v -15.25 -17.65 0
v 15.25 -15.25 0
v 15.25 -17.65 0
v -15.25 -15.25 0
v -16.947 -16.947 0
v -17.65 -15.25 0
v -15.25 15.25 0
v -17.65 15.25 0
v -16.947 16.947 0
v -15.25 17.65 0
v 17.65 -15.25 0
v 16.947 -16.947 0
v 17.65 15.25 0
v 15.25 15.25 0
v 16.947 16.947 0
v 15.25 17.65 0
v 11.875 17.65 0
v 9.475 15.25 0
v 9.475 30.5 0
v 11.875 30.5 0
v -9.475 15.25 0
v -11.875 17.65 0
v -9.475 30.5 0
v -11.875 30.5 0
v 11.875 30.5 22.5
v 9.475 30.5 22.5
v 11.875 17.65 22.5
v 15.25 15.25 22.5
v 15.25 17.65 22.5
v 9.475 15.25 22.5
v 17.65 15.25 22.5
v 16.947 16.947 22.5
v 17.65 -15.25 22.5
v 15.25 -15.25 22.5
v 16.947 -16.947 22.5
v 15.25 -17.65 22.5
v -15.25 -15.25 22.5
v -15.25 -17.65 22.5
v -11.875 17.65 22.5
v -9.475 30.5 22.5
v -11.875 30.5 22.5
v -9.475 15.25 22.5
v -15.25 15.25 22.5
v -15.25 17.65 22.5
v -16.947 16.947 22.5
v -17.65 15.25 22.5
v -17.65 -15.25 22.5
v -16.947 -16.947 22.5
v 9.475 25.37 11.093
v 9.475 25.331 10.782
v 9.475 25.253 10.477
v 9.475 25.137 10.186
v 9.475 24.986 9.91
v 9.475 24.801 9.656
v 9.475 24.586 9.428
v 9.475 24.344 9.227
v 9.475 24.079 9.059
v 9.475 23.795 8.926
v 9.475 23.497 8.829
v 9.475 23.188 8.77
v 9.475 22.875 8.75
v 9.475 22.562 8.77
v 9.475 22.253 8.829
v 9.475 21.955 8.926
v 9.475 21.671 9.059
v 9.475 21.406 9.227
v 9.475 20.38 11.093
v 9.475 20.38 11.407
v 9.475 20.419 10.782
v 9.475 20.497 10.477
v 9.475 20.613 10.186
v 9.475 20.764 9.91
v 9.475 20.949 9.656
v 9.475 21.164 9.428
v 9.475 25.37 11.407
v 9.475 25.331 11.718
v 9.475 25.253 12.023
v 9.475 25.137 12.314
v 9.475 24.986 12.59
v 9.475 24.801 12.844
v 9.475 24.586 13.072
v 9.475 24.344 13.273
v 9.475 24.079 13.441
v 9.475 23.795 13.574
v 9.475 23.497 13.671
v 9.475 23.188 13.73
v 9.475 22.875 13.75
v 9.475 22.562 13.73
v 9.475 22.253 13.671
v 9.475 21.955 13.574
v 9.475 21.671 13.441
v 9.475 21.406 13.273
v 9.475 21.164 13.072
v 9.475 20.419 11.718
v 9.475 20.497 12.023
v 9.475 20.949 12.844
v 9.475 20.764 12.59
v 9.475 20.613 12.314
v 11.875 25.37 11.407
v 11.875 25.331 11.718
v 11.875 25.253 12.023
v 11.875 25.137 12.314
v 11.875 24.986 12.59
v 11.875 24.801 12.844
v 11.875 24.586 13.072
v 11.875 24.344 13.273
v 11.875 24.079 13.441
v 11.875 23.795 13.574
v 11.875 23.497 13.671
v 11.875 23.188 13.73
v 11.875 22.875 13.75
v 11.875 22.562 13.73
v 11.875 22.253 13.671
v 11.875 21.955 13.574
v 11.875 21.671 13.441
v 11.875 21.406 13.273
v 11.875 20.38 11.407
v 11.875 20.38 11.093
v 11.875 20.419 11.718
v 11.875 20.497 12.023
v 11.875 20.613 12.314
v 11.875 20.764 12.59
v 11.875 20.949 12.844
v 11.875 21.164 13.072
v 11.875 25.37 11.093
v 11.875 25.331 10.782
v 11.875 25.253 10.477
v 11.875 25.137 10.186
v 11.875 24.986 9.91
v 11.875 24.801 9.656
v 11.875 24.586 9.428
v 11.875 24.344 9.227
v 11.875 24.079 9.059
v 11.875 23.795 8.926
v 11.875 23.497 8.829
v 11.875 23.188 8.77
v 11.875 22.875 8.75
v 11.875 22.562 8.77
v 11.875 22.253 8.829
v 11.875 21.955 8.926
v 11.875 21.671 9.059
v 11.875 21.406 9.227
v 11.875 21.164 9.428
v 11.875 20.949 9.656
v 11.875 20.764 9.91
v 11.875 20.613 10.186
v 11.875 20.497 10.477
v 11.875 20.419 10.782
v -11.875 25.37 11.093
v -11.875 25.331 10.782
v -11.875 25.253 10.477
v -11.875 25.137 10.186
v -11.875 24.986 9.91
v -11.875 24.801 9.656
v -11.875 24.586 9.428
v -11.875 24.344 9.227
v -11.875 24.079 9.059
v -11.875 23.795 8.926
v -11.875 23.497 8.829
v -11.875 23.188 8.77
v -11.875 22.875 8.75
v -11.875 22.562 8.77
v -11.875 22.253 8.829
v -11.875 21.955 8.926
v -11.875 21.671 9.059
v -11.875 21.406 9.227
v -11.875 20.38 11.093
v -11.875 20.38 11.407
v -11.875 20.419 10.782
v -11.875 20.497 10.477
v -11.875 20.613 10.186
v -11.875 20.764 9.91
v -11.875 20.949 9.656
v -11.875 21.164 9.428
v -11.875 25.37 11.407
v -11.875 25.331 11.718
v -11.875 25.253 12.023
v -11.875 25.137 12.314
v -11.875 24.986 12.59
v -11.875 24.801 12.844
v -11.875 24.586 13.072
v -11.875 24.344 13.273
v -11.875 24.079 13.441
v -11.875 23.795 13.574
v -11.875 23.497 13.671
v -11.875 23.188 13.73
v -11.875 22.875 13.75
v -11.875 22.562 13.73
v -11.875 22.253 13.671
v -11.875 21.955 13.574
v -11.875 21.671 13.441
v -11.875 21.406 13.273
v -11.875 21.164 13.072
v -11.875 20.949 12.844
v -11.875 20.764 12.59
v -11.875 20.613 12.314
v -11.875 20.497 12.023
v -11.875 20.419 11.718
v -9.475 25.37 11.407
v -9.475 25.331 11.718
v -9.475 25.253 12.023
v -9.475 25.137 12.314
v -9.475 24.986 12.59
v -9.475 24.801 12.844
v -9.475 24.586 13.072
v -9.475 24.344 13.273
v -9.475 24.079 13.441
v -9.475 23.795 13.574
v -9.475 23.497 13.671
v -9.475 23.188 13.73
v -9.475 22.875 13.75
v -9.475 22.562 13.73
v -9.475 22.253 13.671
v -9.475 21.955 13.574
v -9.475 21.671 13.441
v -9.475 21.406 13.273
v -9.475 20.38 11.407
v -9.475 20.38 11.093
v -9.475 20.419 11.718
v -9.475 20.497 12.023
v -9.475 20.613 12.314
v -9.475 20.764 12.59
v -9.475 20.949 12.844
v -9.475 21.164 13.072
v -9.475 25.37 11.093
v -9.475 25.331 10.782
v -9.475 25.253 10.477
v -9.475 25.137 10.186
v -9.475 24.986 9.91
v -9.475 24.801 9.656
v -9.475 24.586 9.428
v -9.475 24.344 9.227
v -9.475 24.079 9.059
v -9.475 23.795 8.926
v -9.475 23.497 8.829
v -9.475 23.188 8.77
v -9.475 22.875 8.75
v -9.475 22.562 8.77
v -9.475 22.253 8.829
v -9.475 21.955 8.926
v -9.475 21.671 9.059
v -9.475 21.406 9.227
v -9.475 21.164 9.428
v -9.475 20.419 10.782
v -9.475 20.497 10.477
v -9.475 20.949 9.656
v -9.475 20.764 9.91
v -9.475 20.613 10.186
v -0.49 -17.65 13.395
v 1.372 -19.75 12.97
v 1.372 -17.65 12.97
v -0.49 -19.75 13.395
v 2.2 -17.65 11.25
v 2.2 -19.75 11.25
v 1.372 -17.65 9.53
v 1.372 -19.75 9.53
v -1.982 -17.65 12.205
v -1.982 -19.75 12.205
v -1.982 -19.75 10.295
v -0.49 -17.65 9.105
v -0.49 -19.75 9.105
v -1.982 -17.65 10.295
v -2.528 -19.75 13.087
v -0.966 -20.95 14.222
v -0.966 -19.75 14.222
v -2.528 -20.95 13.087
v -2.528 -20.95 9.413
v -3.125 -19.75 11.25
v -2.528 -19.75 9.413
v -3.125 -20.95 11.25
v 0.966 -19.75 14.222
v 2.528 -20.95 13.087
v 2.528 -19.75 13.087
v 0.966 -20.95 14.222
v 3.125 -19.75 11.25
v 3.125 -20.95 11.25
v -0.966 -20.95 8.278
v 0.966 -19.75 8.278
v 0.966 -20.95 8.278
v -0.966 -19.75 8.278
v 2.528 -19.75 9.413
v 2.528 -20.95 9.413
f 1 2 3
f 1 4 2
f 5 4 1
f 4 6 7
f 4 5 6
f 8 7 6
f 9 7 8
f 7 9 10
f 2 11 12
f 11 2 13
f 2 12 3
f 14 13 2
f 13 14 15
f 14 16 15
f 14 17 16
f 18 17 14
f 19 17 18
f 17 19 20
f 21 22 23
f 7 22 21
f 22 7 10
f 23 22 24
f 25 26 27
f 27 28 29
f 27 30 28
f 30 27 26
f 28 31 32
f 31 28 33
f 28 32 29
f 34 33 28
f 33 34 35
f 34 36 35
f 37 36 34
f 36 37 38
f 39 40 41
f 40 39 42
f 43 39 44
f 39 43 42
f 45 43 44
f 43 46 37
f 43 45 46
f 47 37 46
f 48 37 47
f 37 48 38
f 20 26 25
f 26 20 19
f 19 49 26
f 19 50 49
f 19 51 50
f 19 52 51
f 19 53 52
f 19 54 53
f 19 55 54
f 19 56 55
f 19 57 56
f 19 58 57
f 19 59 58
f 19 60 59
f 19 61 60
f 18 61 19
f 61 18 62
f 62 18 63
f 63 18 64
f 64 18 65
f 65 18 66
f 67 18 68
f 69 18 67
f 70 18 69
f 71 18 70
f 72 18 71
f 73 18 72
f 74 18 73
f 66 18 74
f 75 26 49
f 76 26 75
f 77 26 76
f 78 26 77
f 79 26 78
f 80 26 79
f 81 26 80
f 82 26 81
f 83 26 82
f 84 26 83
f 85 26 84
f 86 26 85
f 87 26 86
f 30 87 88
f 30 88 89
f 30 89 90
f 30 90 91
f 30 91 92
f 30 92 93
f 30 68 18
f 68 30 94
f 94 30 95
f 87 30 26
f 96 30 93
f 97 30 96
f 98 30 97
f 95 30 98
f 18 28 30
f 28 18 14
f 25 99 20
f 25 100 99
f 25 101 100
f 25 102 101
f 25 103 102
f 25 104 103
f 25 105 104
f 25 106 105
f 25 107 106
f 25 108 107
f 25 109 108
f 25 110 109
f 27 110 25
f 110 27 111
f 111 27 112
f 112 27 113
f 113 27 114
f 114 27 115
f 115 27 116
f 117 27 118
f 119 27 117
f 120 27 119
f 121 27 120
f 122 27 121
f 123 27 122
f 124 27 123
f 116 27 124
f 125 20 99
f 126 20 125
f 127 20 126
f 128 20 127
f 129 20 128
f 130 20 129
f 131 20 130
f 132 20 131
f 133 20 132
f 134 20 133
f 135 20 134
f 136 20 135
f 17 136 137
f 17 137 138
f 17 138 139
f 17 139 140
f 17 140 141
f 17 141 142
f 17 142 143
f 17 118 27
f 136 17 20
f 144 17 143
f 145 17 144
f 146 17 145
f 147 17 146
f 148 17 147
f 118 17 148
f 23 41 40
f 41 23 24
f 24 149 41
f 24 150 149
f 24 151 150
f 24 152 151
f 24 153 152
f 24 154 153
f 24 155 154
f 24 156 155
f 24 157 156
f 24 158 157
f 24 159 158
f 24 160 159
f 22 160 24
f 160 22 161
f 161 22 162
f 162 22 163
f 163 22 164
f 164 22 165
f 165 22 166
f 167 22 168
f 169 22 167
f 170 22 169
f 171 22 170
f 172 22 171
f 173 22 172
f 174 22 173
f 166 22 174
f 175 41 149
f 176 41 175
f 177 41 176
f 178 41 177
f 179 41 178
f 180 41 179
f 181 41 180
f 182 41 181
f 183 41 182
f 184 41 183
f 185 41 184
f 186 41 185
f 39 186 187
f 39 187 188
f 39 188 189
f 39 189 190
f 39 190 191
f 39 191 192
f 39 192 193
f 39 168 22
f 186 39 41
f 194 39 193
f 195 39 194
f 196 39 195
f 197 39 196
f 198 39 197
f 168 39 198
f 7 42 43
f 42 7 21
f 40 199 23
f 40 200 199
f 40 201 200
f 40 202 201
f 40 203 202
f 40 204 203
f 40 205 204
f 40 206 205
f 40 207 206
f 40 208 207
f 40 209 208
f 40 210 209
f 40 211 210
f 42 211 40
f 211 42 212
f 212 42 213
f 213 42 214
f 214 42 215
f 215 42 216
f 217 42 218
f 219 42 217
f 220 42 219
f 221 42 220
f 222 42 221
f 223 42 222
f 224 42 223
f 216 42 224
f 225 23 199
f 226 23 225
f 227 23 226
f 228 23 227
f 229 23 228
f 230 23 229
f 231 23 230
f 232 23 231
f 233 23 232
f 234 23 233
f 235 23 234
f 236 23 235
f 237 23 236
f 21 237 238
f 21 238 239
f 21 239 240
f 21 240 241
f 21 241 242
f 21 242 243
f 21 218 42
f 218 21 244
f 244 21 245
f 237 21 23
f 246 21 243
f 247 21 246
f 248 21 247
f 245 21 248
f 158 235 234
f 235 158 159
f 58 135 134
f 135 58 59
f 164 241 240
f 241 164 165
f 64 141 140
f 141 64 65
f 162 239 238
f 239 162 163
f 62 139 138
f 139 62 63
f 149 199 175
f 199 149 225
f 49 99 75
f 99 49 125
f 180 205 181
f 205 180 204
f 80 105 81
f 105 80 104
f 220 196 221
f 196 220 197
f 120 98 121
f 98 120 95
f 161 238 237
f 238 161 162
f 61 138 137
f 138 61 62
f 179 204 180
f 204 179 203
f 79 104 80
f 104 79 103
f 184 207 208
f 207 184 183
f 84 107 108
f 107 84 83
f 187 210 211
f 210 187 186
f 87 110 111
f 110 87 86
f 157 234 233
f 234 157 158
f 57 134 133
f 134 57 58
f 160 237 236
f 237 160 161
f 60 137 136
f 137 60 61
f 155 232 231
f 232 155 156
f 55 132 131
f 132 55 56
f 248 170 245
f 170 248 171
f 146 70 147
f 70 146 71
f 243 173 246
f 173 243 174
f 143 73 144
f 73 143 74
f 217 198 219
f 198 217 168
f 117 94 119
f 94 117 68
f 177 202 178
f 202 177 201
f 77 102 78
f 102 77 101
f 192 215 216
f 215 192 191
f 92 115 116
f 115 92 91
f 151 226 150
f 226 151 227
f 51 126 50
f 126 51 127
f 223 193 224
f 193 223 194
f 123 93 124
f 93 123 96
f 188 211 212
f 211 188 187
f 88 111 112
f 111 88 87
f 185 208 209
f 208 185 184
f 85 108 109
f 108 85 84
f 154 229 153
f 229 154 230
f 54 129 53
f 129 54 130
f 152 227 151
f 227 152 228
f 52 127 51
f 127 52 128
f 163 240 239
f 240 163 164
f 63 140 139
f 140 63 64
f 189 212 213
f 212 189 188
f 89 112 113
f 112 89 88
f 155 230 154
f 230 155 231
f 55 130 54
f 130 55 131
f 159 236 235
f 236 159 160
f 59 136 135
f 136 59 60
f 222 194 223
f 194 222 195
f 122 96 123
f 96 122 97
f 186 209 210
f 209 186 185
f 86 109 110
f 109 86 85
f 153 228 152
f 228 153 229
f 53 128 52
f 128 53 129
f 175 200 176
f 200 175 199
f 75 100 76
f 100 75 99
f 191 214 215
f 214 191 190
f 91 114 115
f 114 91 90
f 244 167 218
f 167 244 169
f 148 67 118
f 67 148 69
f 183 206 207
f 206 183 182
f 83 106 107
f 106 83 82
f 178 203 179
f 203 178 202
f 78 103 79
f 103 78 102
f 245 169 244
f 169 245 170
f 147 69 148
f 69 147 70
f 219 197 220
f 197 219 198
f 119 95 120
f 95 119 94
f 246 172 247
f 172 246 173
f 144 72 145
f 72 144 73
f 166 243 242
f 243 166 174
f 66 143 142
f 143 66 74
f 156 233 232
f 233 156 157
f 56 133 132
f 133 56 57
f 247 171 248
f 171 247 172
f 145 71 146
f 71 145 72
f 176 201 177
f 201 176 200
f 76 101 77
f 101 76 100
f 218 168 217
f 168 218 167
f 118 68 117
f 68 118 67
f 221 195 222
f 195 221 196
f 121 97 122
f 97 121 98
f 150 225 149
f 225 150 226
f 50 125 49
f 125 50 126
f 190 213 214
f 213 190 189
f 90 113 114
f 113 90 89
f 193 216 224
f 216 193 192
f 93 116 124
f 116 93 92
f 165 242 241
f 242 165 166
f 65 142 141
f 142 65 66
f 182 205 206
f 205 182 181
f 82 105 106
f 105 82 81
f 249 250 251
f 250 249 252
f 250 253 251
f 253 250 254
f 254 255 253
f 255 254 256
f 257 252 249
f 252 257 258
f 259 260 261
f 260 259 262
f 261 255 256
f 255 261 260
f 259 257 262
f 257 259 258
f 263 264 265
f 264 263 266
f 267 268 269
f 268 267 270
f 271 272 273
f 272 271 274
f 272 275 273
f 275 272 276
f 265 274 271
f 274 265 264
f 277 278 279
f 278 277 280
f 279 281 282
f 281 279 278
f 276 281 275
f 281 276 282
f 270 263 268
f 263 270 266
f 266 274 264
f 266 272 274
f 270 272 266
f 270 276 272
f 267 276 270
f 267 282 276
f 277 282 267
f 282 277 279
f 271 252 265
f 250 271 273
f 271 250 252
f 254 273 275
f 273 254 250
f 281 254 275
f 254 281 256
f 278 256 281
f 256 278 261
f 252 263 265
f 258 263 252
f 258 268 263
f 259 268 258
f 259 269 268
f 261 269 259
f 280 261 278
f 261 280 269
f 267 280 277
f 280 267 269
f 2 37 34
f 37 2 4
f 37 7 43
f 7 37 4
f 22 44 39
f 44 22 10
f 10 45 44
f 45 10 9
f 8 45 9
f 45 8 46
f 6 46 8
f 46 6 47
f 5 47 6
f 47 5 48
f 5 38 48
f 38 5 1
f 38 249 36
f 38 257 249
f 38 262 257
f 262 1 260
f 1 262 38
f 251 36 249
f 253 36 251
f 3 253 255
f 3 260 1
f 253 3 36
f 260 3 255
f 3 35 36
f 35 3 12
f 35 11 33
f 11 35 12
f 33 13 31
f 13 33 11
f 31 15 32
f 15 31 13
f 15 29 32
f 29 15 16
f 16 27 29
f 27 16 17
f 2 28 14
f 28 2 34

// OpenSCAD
size = 30.5;  // The length of the square
height = 22.5; // originally height = size
thread = 0.4;
thickness = 6;
inset = size * 0.15;
length = size / 2;
screw_d = 5;

offset_ = thread * thickness;

inner_screw = 4.4;
outer_cylinder = 6.25;
nail_head = thread * 3; // 1.2 mm
nail_length = 3;        // 3 mm until head

union()
{
    linear_extrude(height)
    {
        difference()
        {
            offset(offset_)
            {
                square(size = size, center = true);
            }
            square(size = size, center = true);
            hull()
            {
                translate([ (size / 2) - (inset), size - (length / 2) ])
                {
                    square([ offset_, length ], center = true);
                };
                translate([ -((size / 2) - (inset)), size - (length / 2) ])
                {
                    square([ offset_, length ], center = true);
                };
            }
        }
    }

    difference()
    {
        linear_extrude(height)
        {
            translate([ (size / 2) - (inset), size - (length / 2) ])
            {
                square([ offset_, length ], center = true);
            };
            translate([ -((size / 2) - (inset)), size - (length / 2) ])
            {
                square([ offset_, length ], center = true);
            };
        };
        translate([ 0, (size / 2) + (length / 2), height / 2 ])
        {
            rotate([ 0, 90, 0 ])
            {
                cylinder(h = size, r = screw_d / 2, center = true, $fn = 50);
            }
        }
    }
    {
        translate([ 0, -((size / 2) + (offset_ * 1.5)), height / 2 ])
        {
            rotate([ 90, 0, 0 ])
            {
                union()
                {
                    cylinder(h = nail_length, d = inner_screw, center = true);
                    translate([ 0, 0, nail_length / 2 ])
                    {
                        cylinder(h = nail_head, d = outer_cylinder, center = true);
                    }
                }
            }
        }
    }
}
